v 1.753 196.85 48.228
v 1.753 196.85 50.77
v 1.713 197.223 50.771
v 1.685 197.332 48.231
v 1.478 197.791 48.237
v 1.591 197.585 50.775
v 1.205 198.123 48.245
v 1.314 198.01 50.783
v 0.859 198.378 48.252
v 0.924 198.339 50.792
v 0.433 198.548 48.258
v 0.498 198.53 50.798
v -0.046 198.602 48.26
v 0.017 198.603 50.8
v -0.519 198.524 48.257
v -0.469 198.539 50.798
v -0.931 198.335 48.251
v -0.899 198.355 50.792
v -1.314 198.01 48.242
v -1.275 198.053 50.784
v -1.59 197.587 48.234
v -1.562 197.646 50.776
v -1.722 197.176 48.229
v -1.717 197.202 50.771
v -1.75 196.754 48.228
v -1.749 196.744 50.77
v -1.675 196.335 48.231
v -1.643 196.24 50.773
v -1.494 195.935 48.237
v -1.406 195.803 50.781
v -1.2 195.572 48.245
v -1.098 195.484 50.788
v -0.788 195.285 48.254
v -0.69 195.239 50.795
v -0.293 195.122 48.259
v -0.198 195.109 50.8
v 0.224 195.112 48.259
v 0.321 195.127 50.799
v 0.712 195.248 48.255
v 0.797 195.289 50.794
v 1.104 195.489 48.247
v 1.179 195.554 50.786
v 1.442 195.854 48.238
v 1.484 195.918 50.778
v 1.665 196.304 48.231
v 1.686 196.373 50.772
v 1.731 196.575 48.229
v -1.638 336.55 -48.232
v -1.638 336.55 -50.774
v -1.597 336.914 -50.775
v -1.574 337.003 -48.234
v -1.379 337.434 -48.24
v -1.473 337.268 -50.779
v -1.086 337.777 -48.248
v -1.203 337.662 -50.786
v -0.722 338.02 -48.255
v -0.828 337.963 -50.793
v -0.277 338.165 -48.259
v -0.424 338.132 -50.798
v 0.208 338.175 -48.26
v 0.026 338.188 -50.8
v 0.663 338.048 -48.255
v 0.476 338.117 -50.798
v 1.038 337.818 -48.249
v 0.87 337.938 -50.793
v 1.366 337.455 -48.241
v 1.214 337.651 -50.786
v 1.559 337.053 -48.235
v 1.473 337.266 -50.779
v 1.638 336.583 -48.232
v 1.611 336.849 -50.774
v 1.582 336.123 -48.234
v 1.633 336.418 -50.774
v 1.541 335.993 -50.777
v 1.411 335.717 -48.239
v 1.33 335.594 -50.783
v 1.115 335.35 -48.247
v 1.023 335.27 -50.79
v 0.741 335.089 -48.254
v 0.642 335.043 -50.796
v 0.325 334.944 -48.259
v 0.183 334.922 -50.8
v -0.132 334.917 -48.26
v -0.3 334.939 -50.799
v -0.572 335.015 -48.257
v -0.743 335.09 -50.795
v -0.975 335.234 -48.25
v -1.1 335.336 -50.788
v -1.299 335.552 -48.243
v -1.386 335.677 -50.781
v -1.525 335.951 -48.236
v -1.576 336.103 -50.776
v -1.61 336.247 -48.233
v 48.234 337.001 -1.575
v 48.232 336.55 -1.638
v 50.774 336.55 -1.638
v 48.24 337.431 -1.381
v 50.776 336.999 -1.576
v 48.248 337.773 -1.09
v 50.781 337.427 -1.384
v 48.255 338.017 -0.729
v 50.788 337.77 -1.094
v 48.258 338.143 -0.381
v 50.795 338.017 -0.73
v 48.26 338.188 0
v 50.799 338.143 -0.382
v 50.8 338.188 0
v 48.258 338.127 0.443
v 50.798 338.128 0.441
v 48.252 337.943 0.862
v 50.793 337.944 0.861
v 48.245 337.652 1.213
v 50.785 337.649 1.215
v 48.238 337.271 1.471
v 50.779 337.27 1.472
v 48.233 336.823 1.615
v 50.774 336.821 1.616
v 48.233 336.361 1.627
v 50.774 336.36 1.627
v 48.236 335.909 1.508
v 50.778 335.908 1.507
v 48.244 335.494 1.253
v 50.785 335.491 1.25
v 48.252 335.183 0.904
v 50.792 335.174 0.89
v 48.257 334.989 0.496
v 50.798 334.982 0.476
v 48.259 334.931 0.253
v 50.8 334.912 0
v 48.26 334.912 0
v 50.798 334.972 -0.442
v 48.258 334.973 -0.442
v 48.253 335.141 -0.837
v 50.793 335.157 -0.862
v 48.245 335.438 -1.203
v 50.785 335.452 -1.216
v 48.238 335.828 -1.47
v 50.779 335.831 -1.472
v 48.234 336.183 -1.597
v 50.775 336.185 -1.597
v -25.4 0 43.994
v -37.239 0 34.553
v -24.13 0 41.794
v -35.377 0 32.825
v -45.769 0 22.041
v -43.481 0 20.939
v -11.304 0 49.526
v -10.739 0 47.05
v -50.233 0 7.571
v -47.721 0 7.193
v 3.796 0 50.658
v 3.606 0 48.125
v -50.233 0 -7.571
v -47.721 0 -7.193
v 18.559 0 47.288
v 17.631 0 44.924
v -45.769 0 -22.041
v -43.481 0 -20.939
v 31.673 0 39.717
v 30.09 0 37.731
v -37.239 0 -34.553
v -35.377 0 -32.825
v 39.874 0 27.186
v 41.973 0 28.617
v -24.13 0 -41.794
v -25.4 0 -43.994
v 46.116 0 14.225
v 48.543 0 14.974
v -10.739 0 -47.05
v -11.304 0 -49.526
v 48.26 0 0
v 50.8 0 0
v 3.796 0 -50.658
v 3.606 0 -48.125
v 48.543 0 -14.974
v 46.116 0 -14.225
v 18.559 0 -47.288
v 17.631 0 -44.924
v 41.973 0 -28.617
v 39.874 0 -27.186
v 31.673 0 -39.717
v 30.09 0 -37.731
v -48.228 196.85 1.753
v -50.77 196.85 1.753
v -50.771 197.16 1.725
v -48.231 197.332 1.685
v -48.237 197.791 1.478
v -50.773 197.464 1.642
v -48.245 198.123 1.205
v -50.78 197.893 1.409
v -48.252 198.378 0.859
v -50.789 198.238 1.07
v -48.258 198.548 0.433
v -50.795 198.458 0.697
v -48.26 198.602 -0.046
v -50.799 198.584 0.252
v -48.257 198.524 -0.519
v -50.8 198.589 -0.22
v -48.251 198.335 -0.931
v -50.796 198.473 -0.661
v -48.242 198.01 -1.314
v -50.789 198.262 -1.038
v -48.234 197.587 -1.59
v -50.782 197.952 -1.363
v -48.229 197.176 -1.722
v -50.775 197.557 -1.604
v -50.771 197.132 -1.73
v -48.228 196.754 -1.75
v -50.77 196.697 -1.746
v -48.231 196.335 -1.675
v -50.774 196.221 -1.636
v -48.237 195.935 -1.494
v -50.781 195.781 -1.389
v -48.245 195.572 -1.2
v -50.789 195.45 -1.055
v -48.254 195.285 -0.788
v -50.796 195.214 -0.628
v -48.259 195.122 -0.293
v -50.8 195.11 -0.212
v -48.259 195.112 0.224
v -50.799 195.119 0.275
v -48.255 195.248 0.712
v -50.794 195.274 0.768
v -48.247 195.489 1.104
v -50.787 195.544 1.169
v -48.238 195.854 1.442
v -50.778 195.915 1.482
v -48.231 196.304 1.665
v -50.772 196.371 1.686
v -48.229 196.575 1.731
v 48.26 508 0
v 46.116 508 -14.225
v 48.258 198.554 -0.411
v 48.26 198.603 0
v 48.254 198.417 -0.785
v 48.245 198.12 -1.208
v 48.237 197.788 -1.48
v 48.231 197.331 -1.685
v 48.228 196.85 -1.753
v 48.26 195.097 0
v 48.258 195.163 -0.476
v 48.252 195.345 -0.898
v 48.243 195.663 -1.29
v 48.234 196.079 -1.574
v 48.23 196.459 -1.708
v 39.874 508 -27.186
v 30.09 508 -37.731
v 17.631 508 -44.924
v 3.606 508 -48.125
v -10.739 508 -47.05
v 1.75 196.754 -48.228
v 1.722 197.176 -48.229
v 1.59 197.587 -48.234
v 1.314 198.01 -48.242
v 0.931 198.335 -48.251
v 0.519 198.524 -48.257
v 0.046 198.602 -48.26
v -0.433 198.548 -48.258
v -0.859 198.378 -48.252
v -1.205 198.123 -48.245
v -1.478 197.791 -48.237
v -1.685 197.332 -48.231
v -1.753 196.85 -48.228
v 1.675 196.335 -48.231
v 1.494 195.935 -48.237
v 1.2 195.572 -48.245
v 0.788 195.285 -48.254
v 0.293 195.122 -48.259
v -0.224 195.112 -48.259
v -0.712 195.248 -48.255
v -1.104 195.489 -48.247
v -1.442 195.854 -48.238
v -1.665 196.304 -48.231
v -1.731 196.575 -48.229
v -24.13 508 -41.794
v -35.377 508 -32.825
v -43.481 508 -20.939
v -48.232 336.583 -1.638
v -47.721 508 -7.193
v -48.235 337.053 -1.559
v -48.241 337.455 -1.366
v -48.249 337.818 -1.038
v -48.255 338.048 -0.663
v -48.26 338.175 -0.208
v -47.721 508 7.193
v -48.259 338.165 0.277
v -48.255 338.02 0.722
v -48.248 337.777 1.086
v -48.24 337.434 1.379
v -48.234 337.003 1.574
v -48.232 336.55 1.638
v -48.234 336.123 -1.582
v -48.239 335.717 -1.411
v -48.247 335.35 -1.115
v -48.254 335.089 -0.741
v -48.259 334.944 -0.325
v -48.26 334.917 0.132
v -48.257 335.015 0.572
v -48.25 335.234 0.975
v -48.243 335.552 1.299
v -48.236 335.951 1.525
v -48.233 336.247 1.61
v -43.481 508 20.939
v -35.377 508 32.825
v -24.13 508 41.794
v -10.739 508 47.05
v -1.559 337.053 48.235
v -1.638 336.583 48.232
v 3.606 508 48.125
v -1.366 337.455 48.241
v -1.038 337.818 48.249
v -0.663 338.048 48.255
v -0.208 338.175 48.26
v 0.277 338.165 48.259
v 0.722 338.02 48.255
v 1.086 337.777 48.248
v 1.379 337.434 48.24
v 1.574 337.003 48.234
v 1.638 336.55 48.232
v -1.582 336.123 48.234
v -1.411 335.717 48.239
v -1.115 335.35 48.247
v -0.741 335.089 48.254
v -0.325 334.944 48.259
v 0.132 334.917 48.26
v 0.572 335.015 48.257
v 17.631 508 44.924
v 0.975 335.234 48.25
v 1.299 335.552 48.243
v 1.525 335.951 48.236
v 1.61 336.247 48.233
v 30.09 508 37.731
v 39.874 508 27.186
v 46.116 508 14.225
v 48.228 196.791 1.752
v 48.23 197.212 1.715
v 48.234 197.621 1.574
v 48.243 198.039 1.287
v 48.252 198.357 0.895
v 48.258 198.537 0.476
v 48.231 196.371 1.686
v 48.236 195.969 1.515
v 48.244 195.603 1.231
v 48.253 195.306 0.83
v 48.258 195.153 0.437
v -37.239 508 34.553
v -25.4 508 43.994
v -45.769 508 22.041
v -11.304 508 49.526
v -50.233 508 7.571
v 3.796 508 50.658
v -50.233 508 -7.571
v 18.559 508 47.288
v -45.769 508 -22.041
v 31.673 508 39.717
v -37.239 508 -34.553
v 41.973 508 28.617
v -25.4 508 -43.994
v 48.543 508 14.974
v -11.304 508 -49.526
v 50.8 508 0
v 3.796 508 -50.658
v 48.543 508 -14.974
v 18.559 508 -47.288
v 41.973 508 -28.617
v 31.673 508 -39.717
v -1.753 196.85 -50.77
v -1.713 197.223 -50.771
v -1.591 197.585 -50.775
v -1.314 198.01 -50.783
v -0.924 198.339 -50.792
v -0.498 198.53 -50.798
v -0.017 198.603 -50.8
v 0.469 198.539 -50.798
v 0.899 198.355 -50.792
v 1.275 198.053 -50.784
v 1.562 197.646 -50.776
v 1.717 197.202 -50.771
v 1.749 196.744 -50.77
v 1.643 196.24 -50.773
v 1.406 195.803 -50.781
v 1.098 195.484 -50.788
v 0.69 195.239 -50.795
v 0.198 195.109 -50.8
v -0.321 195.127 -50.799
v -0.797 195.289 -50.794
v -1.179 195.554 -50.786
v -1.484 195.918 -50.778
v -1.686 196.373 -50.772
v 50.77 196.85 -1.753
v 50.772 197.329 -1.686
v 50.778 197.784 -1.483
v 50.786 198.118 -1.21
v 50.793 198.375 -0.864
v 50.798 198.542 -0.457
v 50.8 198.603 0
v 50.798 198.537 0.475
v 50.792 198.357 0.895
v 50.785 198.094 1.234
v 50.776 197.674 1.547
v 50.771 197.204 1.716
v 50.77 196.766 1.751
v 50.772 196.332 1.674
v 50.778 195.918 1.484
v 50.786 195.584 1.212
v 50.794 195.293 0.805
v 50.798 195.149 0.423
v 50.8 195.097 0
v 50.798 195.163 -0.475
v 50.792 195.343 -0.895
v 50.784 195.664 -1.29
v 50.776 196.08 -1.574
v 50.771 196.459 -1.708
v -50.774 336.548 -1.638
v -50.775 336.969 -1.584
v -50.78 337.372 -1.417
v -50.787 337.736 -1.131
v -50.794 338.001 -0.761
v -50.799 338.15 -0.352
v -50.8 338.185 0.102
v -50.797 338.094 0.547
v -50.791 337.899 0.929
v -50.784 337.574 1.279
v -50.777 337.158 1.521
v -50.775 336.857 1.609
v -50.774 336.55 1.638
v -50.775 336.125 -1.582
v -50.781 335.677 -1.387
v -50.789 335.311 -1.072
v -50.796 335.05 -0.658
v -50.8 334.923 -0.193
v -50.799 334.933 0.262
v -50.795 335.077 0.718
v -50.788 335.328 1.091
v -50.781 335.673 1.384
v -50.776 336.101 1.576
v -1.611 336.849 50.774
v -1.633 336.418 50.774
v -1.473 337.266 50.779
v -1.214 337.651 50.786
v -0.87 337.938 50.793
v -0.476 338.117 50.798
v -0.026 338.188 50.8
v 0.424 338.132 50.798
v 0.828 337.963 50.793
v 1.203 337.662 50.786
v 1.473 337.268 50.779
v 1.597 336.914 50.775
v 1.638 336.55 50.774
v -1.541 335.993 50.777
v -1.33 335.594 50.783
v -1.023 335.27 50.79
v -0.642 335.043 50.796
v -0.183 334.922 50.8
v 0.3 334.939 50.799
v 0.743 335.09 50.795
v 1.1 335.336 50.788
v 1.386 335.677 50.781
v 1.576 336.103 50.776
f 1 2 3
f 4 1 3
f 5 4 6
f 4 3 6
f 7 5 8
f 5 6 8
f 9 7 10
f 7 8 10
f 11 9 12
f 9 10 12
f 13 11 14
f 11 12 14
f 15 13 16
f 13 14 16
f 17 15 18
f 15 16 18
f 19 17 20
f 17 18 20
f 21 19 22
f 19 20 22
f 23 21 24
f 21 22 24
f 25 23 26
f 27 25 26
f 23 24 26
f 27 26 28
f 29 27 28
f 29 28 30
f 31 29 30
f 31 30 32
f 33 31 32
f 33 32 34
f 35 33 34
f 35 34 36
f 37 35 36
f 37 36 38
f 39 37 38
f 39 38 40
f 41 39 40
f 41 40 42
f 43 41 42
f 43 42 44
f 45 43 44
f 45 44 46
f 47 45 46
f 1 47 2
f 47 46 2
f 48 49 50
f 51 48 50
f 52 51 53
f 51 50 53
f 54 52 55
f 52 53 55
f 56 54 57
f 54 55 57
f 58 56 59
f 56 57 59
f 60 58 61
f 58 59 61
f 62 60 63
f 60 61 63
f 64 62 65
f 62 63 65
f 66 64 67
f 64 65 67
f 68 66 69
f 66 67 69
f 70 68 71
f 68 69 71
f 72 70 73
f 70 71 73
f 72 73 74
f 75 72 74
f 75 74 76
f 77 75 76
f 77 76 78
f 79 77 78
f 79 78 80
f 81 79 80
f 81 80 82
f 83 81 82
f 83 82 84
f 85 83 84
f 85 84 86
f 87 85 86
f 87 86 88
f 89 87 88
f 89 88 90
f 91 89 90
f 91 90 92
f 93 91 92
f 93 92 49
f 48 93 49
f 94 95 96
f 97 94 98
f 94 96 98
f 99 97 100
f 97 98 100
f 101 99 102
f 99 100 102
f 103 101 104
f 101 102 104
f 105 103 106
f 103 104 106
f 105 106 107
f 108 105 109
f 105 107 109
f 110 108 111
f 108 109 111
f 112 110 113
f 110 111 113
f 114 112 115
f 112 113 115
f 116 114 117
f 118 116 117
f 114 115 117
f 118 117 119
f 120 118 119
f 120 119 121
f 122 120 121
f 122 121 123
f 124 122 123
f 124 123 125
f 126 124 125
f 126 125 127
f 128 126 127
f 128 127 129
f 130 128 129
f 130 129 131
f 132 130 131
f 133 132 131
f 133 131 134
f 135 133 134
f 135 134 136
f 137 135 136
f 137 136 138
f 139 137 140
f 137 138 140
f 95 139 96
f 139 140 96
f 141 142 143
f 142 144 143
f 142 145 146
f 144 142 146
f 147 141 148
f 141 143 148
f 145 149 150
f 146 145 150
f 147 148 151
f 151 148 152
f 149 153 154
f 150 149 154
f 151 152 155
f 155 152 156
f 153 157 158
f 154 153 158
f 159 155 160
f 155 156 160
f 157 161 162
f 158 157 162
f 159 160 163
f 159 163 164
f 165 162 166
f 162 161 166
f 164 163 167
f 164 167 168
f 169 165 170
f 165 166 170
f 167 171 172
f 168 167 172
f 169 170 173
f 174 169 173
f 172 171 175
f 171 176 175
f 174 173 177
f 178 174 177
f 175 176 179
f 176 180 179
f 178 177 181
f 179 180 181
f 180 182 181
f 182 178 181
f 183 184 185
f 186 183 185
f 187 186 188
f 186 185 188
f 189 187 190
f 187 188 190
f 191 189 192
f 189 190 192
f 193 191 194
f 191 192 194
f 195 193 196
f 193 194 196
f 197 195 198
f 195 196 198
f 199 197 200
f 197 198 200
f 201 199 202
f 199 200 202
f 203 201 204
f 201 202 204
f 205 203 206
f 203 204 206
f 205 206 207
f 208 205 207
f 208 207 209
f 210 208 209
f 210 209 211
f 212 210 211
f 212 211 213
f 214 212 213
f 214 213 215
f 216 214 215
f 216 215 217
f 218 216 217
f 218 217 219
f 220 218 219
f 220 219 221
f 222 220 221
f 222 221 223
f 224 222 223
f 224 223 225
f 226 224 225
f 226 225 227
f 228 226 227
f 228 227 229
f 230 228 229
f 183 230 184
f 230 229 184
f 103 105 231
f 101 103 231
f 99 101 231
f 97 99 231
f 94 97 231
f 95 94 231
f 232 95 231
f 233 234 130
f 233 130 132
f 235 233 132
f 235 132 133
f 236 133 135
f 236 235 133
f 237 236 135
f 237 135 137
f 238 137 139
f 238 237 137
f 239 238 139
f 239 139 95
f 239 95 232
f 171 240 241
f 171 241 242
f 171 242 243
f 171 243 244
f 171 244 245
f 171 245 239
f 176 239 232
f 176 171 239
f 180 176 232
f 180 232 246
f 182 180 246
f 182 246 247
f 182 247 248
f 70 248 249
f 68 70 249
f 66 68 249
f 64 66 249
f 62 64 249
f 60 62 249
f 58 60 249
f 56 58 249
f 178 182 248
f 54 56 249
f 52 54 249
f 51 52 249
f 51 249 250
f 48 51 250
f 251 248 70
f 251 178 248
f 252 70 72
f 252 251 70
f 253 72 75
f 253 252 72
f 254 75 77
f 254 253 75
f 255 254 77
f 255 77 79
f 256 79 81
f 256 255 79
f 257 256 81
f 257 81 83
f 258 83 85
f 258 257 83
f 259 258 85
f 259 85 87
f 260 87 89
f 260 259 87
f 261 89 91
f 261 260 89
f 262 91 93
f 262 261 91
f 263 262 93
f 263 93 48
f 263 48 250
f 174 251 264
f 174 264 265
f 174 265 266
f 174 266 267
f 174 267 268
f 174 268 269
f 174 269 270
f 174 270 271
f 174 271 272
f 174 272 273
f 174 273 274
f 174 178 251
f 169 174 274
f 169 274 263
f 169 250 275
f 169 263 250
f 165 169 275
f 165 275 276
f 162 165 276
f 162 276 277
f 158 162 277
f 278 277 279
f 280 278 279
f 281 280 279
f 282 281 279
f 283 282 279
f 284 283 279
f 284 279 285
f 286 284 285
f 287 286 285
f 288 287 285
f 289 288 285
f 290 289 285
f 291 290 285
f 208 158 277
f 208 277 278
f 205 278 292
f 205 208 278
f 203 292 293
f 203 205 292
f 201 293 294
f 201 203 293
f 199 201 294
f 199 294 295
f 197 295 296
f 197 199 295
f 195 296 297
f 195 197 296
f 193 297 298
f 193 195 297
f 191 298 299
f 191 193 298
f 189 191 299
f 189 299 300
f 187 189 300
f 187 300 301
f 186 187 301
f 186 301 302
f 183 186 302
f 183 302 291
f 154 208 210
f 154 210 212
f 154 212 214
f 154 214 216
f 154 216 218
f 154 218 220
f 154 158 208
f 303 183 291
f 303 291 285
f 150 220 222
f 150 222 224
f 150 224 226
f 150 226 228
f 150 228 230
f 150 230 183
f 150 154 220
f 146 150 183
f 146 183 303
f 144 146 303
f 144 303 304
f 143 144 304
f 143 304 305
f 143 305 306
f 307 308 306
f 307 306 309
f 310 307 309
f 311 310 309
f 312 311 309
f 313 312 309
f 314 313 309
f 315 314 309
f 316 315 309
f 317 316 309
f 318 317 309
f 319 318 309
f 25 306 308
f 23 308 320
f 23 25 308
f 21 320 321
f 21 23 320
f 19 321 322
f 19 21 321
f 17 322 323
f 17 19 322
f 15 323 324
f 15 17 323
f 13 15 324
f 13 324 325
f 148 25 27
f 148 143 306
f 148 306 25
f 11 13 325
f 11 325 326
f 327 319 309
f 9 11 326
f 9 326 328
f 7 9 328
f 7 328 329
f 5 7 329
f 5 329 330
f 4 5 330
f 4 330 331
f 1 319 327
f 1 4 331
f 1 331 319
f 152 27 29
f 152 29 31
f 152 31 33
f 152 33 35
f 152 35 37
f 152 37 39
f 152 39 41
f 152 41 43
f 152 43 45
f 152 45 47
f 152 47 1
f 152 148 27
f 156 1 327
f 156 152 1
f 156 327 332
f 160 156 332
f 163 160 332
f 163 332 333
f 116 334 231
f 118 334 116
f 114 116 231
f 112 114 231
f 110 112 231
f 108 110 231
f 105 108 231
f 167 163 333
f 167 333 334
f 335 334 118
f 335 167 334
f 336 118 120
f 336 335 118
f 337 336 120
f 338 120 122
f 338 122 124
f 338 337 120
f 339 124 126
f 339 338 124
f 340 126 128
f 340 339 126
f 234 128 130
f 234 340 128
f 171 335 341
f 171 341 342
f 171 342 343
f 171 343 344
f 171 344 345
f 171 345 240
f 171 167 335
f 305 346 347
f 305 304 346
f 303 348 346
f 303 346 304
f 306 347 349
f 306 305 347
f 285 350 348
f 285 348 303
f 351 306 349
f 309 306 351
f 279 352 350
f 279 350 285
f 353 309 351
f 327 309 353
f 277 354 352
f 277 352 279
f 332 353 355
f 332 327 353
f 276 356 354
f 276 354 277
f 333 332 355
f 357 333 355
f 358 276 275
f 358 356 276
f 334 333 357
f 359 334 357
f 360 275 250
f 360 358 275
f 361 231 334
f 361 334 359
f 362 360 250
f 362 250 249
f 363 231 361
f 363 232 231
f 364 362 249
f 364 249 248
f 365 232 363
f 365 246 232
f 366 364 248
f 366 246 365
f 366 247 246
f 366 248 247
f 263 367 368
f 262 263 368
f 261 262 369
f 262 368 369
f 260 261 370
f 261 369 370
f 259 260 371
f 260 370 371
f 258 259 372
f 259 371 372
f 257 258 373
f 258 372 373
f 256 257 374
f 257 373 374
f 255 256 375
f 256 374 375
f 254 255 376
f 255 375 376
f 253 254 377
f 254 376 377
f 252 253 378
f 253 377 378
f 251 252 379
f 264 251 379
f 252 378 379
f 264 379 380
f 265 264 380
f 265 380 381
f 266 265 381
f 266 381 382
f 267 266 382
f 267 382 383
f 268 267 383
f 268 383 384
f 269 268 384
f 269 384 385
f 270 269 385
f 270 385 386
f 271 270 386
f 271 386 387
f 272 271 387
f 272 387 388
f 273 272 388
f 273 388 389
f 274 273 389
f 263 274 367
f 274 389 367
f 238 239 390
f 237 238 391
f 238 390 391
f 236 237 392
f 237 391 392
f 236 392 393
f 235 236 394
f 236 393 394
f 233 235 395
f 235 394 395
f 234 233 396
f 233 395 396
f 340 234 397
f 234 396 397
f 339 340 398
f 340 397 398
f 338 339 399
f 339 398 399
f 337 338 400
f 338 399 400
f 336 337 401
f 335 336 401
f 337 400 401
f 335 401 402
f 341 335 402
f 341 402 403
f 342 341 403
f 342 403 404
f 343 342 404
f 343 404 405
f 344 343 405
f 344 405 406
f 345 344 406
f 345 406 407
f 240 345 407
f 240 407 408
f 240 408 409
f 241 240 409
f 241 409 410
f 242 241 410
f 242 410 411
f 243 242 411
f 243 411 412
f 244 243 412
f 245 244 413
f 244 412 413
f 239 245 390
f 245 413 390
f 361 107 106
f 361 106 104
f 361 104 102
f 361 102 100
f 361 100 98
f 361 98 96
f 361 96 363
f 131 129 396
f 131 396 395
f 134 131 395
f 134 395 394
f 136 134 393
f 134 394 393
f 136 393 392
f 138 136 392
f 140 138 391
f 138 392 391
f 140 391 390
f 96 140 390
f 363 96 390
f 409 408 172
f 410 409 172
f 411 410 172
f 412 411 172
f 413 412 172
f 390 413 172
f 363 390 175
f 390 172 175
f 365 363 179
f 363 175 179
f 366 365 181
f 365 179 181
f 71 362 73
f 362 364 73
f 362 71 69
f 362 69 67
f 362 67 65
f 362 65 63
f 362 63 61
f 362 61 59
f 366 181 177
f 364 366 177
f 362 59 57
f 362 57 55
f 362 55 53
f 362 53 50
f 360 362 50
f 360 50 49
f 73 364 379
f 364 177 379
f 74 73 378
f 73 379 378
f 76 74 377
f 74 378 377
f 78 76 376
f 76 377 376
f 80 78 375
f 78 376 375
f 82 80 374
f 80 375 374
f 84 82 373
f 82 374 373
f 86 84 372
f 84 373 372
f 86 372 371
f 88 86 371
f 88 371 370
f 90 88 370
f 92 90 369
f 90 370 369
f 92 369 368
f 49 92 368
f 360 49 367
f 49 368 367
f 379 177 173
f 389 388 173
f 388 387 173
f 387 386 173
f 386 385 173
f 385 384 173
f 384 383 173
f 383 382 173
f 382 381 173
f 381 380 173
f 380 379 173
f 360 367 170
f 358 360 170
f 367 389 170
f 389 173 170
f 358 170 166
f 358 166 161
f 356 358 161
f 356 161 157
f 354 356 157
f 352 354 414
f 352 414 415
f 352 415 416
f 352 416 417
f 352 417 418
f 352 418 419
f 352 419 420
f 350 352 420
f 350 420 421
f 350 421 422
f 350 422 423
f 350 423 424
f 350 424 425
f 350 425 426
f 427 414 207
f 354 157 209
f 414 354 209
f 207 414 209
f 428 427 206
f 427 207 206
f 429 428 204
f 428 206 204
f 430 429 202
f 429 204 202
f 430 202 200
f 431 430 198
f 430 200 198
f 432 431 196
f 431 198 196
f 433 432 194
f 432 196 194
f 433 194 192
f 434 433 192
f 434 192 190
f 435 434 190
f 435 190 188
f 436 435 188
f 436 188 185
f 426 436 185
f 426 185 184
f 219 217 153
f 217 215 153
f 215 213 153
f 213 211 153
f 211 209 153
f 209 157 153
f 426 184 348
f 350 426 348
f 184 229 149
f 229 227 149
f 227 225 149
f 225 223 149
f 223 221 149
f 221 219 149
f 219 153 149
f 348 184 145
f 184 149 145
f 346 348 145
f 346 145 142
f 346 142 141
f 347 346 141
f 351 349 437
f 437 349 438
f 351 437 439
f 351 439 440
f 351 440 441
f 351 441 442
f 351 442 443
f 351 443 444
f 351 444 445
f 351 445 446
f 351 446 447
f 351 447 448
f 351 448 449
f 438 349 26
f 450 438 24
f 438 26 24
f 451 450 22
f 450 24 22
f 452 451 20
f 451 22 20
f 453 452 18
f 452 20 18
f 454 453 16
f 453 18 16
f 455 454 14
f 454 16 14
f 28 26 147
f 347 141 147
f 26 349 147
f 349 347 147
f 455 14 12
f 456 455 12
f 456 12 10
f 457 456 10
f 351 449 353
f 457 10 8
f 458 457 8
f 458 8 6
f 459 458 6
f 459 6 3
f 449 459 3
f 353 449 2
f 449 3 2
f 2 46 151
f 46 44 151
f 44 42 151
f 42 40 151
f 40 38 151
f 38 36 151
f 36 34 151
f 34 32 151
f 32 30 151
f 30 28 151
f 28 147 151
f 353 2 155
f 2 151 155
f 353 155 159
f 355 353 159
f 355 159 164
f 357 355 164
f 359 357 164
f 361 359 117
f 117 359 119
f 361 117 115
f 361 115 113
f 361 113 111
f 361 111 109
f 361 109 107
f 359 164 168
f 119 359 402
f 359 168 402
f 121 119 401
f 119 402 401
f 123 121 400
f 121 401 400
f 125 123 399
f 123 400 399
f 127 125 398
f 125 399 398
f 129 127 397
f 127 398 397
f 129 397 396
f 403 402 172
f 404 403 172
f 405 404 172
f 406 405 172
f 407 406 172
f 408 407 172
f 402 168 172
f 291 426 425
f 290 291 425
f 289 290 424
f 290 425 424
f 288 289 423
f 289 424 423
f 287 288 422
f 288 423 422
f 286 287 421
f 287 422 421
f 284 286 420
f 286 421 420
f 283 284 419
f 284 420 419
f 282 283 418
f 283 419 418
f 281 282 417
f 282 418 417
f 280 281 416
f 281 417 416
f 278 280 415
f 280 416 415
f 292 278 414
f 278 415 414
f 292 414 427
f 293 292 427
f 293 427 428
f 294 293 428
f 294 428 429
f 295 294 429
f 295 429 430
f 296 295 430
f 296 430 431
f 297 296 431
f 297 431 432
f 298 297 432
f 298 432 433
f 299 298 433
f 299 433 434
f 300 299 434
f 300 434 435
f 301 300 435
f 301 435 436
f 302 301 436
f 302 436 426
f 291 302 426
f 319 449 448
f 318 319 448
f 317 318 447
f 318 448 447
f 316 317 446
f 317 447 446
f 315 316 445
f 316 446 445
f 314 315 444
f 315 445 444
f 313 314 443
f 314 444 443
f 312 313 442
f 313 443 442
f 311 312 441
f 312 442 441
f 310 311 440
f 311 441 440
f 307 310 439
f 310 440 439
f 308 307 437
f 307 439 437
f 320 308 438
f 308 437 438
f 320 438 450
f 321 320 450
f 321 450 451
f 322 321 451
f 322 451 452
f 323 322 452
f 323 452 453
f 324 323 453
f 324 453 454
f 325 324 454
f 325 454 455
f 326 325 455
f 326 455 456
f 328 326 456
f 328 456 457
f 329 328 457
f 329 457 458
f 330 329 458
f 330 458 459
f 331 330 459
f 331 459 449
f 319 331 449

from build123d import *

# Parameters (mm, degrees)
SKETCH1_R                = 50.8
SKETCH1_R_2              = 48.26
COUPLER_EXTRUSION_DEPTH  = 508
BULKHEAD_HOLE_REACH      = 522.545
BULKHEAD_HOLE_END_RADIUS = 48.26
SKETCH2_R                = 1.6383
CIRPATTERN1_COUNT        = 4
CUT_EXTRUDE1_REACH       = 522.545
CUT_EXTRUDE1_END_RADIUS  = 48.26
SKETCH3_R                = 1.7526
CIRPATTERN2_COUNT        = 4


with BuildPart() as part:
    # Sketch1 → Coupler Extrusion (new body)
    with BuildSketch(Plane(origin=(0, 0, 0), x_dir=(1, 0, 0), z_dir=(0, 1, 0))):
        Circle(SKETCH1_R)
        Circle(SKETCH1_R_2, mode=Mode.SUBTRACT)
    extrude(amount=COUPLER_EXTRUSION_DEPTH)

    # Bulkhead Hole: up to this cylinder (the profile starts outside it)
    bulkhead_hole_end = Plane(origin=(0, 336.55, 0), z_dir=(0, -1, 0)) * Cylinder(BULKHEAD_HOLE_END_RADIUS, 1142.61, mode=Mode.PRIVATE)
    # Sketch2 → Bulkhead Hole (cut, up to the surface)
    with BuildSketch(Plane.XY.offset(50.8), mode=Mode.PRIVATE) as bulkhead_hole_sk1:
        with Locations((0, 336.55)):
            Circle(SKETCH2_R)
    bulkhead_hole_tool1 = extrude(bulkhead_hole_sk1.sketch, amount=-BULKHEAD_HOLE_REACH, mode=Mode.PRIVATE) - bulkhead_hole_end
    bulkhead_hole = bulkhead_hole_tool1.solids().sort_by_distance((0, 336.55, 50.8))[0]
    add(bulkhead_hole, mode=Mode.SUBTRACT)

    # CirPattern1: Bulkhead Hole ×4 about axis
    cirpattern1_axis = Axis((0, 508, 0), (0, -1, 0))
    for i in range(1, CIRPATTERN1_COUNT):
        add(bulkhead_hole.rotate(cirpattern1_axis, i * 360 / CIRPATTERN1_COUNT), mode=Mode.SUBTRACT)

    # Cut-Extrude1: up to this cylinder (the profile starts outside it)
    cut_extrude1_end = Plane(origin=(0, 196.85, 0), z_dir=(0, -1, 0)) * Cylinder(CUT_EXTRUDE1_END_RADIUS, 1142.61, mode=Mode.PRIVATE)
    # Sketch3 → Cut-Extrude1 (cut, up to the surface)
    with BuildSketch(Plane.XY.offset(50.8), mode=Mode.PRIVATE) as cut_extrude1_sk1:
        with Locations((0, 196.85)):
            Circle(SKETCH3_R)
    cut_extrude1_tool1 = extrude(cut_extrude1_sk1.sketch, amount=-CUT_EXTRUDE1_REACH, mode=Mode.PRIVATE) - cut_extrude1_end
    cut_extrude1 = cut_extrude1_tool1.solids().sort_by_distance((0, 196.85, 50.8))[0]
    add(cut_extrude1, mode=Mode.SUBTRACT)

    # CirPattern2: Cut-Extrude1 ×4 about axis
    cirpattern2_axis = Axis((0, 508, 0), (0, -1, 0))
    for i in range(1, CIRPATTERN2_COUNT):
        add(cut_extrude1.rotate(cirpattern2_axis, i * 360 / CIRPATTERN2_COUNT), mode=Mode.SUBTRACT)


solid = part.part
